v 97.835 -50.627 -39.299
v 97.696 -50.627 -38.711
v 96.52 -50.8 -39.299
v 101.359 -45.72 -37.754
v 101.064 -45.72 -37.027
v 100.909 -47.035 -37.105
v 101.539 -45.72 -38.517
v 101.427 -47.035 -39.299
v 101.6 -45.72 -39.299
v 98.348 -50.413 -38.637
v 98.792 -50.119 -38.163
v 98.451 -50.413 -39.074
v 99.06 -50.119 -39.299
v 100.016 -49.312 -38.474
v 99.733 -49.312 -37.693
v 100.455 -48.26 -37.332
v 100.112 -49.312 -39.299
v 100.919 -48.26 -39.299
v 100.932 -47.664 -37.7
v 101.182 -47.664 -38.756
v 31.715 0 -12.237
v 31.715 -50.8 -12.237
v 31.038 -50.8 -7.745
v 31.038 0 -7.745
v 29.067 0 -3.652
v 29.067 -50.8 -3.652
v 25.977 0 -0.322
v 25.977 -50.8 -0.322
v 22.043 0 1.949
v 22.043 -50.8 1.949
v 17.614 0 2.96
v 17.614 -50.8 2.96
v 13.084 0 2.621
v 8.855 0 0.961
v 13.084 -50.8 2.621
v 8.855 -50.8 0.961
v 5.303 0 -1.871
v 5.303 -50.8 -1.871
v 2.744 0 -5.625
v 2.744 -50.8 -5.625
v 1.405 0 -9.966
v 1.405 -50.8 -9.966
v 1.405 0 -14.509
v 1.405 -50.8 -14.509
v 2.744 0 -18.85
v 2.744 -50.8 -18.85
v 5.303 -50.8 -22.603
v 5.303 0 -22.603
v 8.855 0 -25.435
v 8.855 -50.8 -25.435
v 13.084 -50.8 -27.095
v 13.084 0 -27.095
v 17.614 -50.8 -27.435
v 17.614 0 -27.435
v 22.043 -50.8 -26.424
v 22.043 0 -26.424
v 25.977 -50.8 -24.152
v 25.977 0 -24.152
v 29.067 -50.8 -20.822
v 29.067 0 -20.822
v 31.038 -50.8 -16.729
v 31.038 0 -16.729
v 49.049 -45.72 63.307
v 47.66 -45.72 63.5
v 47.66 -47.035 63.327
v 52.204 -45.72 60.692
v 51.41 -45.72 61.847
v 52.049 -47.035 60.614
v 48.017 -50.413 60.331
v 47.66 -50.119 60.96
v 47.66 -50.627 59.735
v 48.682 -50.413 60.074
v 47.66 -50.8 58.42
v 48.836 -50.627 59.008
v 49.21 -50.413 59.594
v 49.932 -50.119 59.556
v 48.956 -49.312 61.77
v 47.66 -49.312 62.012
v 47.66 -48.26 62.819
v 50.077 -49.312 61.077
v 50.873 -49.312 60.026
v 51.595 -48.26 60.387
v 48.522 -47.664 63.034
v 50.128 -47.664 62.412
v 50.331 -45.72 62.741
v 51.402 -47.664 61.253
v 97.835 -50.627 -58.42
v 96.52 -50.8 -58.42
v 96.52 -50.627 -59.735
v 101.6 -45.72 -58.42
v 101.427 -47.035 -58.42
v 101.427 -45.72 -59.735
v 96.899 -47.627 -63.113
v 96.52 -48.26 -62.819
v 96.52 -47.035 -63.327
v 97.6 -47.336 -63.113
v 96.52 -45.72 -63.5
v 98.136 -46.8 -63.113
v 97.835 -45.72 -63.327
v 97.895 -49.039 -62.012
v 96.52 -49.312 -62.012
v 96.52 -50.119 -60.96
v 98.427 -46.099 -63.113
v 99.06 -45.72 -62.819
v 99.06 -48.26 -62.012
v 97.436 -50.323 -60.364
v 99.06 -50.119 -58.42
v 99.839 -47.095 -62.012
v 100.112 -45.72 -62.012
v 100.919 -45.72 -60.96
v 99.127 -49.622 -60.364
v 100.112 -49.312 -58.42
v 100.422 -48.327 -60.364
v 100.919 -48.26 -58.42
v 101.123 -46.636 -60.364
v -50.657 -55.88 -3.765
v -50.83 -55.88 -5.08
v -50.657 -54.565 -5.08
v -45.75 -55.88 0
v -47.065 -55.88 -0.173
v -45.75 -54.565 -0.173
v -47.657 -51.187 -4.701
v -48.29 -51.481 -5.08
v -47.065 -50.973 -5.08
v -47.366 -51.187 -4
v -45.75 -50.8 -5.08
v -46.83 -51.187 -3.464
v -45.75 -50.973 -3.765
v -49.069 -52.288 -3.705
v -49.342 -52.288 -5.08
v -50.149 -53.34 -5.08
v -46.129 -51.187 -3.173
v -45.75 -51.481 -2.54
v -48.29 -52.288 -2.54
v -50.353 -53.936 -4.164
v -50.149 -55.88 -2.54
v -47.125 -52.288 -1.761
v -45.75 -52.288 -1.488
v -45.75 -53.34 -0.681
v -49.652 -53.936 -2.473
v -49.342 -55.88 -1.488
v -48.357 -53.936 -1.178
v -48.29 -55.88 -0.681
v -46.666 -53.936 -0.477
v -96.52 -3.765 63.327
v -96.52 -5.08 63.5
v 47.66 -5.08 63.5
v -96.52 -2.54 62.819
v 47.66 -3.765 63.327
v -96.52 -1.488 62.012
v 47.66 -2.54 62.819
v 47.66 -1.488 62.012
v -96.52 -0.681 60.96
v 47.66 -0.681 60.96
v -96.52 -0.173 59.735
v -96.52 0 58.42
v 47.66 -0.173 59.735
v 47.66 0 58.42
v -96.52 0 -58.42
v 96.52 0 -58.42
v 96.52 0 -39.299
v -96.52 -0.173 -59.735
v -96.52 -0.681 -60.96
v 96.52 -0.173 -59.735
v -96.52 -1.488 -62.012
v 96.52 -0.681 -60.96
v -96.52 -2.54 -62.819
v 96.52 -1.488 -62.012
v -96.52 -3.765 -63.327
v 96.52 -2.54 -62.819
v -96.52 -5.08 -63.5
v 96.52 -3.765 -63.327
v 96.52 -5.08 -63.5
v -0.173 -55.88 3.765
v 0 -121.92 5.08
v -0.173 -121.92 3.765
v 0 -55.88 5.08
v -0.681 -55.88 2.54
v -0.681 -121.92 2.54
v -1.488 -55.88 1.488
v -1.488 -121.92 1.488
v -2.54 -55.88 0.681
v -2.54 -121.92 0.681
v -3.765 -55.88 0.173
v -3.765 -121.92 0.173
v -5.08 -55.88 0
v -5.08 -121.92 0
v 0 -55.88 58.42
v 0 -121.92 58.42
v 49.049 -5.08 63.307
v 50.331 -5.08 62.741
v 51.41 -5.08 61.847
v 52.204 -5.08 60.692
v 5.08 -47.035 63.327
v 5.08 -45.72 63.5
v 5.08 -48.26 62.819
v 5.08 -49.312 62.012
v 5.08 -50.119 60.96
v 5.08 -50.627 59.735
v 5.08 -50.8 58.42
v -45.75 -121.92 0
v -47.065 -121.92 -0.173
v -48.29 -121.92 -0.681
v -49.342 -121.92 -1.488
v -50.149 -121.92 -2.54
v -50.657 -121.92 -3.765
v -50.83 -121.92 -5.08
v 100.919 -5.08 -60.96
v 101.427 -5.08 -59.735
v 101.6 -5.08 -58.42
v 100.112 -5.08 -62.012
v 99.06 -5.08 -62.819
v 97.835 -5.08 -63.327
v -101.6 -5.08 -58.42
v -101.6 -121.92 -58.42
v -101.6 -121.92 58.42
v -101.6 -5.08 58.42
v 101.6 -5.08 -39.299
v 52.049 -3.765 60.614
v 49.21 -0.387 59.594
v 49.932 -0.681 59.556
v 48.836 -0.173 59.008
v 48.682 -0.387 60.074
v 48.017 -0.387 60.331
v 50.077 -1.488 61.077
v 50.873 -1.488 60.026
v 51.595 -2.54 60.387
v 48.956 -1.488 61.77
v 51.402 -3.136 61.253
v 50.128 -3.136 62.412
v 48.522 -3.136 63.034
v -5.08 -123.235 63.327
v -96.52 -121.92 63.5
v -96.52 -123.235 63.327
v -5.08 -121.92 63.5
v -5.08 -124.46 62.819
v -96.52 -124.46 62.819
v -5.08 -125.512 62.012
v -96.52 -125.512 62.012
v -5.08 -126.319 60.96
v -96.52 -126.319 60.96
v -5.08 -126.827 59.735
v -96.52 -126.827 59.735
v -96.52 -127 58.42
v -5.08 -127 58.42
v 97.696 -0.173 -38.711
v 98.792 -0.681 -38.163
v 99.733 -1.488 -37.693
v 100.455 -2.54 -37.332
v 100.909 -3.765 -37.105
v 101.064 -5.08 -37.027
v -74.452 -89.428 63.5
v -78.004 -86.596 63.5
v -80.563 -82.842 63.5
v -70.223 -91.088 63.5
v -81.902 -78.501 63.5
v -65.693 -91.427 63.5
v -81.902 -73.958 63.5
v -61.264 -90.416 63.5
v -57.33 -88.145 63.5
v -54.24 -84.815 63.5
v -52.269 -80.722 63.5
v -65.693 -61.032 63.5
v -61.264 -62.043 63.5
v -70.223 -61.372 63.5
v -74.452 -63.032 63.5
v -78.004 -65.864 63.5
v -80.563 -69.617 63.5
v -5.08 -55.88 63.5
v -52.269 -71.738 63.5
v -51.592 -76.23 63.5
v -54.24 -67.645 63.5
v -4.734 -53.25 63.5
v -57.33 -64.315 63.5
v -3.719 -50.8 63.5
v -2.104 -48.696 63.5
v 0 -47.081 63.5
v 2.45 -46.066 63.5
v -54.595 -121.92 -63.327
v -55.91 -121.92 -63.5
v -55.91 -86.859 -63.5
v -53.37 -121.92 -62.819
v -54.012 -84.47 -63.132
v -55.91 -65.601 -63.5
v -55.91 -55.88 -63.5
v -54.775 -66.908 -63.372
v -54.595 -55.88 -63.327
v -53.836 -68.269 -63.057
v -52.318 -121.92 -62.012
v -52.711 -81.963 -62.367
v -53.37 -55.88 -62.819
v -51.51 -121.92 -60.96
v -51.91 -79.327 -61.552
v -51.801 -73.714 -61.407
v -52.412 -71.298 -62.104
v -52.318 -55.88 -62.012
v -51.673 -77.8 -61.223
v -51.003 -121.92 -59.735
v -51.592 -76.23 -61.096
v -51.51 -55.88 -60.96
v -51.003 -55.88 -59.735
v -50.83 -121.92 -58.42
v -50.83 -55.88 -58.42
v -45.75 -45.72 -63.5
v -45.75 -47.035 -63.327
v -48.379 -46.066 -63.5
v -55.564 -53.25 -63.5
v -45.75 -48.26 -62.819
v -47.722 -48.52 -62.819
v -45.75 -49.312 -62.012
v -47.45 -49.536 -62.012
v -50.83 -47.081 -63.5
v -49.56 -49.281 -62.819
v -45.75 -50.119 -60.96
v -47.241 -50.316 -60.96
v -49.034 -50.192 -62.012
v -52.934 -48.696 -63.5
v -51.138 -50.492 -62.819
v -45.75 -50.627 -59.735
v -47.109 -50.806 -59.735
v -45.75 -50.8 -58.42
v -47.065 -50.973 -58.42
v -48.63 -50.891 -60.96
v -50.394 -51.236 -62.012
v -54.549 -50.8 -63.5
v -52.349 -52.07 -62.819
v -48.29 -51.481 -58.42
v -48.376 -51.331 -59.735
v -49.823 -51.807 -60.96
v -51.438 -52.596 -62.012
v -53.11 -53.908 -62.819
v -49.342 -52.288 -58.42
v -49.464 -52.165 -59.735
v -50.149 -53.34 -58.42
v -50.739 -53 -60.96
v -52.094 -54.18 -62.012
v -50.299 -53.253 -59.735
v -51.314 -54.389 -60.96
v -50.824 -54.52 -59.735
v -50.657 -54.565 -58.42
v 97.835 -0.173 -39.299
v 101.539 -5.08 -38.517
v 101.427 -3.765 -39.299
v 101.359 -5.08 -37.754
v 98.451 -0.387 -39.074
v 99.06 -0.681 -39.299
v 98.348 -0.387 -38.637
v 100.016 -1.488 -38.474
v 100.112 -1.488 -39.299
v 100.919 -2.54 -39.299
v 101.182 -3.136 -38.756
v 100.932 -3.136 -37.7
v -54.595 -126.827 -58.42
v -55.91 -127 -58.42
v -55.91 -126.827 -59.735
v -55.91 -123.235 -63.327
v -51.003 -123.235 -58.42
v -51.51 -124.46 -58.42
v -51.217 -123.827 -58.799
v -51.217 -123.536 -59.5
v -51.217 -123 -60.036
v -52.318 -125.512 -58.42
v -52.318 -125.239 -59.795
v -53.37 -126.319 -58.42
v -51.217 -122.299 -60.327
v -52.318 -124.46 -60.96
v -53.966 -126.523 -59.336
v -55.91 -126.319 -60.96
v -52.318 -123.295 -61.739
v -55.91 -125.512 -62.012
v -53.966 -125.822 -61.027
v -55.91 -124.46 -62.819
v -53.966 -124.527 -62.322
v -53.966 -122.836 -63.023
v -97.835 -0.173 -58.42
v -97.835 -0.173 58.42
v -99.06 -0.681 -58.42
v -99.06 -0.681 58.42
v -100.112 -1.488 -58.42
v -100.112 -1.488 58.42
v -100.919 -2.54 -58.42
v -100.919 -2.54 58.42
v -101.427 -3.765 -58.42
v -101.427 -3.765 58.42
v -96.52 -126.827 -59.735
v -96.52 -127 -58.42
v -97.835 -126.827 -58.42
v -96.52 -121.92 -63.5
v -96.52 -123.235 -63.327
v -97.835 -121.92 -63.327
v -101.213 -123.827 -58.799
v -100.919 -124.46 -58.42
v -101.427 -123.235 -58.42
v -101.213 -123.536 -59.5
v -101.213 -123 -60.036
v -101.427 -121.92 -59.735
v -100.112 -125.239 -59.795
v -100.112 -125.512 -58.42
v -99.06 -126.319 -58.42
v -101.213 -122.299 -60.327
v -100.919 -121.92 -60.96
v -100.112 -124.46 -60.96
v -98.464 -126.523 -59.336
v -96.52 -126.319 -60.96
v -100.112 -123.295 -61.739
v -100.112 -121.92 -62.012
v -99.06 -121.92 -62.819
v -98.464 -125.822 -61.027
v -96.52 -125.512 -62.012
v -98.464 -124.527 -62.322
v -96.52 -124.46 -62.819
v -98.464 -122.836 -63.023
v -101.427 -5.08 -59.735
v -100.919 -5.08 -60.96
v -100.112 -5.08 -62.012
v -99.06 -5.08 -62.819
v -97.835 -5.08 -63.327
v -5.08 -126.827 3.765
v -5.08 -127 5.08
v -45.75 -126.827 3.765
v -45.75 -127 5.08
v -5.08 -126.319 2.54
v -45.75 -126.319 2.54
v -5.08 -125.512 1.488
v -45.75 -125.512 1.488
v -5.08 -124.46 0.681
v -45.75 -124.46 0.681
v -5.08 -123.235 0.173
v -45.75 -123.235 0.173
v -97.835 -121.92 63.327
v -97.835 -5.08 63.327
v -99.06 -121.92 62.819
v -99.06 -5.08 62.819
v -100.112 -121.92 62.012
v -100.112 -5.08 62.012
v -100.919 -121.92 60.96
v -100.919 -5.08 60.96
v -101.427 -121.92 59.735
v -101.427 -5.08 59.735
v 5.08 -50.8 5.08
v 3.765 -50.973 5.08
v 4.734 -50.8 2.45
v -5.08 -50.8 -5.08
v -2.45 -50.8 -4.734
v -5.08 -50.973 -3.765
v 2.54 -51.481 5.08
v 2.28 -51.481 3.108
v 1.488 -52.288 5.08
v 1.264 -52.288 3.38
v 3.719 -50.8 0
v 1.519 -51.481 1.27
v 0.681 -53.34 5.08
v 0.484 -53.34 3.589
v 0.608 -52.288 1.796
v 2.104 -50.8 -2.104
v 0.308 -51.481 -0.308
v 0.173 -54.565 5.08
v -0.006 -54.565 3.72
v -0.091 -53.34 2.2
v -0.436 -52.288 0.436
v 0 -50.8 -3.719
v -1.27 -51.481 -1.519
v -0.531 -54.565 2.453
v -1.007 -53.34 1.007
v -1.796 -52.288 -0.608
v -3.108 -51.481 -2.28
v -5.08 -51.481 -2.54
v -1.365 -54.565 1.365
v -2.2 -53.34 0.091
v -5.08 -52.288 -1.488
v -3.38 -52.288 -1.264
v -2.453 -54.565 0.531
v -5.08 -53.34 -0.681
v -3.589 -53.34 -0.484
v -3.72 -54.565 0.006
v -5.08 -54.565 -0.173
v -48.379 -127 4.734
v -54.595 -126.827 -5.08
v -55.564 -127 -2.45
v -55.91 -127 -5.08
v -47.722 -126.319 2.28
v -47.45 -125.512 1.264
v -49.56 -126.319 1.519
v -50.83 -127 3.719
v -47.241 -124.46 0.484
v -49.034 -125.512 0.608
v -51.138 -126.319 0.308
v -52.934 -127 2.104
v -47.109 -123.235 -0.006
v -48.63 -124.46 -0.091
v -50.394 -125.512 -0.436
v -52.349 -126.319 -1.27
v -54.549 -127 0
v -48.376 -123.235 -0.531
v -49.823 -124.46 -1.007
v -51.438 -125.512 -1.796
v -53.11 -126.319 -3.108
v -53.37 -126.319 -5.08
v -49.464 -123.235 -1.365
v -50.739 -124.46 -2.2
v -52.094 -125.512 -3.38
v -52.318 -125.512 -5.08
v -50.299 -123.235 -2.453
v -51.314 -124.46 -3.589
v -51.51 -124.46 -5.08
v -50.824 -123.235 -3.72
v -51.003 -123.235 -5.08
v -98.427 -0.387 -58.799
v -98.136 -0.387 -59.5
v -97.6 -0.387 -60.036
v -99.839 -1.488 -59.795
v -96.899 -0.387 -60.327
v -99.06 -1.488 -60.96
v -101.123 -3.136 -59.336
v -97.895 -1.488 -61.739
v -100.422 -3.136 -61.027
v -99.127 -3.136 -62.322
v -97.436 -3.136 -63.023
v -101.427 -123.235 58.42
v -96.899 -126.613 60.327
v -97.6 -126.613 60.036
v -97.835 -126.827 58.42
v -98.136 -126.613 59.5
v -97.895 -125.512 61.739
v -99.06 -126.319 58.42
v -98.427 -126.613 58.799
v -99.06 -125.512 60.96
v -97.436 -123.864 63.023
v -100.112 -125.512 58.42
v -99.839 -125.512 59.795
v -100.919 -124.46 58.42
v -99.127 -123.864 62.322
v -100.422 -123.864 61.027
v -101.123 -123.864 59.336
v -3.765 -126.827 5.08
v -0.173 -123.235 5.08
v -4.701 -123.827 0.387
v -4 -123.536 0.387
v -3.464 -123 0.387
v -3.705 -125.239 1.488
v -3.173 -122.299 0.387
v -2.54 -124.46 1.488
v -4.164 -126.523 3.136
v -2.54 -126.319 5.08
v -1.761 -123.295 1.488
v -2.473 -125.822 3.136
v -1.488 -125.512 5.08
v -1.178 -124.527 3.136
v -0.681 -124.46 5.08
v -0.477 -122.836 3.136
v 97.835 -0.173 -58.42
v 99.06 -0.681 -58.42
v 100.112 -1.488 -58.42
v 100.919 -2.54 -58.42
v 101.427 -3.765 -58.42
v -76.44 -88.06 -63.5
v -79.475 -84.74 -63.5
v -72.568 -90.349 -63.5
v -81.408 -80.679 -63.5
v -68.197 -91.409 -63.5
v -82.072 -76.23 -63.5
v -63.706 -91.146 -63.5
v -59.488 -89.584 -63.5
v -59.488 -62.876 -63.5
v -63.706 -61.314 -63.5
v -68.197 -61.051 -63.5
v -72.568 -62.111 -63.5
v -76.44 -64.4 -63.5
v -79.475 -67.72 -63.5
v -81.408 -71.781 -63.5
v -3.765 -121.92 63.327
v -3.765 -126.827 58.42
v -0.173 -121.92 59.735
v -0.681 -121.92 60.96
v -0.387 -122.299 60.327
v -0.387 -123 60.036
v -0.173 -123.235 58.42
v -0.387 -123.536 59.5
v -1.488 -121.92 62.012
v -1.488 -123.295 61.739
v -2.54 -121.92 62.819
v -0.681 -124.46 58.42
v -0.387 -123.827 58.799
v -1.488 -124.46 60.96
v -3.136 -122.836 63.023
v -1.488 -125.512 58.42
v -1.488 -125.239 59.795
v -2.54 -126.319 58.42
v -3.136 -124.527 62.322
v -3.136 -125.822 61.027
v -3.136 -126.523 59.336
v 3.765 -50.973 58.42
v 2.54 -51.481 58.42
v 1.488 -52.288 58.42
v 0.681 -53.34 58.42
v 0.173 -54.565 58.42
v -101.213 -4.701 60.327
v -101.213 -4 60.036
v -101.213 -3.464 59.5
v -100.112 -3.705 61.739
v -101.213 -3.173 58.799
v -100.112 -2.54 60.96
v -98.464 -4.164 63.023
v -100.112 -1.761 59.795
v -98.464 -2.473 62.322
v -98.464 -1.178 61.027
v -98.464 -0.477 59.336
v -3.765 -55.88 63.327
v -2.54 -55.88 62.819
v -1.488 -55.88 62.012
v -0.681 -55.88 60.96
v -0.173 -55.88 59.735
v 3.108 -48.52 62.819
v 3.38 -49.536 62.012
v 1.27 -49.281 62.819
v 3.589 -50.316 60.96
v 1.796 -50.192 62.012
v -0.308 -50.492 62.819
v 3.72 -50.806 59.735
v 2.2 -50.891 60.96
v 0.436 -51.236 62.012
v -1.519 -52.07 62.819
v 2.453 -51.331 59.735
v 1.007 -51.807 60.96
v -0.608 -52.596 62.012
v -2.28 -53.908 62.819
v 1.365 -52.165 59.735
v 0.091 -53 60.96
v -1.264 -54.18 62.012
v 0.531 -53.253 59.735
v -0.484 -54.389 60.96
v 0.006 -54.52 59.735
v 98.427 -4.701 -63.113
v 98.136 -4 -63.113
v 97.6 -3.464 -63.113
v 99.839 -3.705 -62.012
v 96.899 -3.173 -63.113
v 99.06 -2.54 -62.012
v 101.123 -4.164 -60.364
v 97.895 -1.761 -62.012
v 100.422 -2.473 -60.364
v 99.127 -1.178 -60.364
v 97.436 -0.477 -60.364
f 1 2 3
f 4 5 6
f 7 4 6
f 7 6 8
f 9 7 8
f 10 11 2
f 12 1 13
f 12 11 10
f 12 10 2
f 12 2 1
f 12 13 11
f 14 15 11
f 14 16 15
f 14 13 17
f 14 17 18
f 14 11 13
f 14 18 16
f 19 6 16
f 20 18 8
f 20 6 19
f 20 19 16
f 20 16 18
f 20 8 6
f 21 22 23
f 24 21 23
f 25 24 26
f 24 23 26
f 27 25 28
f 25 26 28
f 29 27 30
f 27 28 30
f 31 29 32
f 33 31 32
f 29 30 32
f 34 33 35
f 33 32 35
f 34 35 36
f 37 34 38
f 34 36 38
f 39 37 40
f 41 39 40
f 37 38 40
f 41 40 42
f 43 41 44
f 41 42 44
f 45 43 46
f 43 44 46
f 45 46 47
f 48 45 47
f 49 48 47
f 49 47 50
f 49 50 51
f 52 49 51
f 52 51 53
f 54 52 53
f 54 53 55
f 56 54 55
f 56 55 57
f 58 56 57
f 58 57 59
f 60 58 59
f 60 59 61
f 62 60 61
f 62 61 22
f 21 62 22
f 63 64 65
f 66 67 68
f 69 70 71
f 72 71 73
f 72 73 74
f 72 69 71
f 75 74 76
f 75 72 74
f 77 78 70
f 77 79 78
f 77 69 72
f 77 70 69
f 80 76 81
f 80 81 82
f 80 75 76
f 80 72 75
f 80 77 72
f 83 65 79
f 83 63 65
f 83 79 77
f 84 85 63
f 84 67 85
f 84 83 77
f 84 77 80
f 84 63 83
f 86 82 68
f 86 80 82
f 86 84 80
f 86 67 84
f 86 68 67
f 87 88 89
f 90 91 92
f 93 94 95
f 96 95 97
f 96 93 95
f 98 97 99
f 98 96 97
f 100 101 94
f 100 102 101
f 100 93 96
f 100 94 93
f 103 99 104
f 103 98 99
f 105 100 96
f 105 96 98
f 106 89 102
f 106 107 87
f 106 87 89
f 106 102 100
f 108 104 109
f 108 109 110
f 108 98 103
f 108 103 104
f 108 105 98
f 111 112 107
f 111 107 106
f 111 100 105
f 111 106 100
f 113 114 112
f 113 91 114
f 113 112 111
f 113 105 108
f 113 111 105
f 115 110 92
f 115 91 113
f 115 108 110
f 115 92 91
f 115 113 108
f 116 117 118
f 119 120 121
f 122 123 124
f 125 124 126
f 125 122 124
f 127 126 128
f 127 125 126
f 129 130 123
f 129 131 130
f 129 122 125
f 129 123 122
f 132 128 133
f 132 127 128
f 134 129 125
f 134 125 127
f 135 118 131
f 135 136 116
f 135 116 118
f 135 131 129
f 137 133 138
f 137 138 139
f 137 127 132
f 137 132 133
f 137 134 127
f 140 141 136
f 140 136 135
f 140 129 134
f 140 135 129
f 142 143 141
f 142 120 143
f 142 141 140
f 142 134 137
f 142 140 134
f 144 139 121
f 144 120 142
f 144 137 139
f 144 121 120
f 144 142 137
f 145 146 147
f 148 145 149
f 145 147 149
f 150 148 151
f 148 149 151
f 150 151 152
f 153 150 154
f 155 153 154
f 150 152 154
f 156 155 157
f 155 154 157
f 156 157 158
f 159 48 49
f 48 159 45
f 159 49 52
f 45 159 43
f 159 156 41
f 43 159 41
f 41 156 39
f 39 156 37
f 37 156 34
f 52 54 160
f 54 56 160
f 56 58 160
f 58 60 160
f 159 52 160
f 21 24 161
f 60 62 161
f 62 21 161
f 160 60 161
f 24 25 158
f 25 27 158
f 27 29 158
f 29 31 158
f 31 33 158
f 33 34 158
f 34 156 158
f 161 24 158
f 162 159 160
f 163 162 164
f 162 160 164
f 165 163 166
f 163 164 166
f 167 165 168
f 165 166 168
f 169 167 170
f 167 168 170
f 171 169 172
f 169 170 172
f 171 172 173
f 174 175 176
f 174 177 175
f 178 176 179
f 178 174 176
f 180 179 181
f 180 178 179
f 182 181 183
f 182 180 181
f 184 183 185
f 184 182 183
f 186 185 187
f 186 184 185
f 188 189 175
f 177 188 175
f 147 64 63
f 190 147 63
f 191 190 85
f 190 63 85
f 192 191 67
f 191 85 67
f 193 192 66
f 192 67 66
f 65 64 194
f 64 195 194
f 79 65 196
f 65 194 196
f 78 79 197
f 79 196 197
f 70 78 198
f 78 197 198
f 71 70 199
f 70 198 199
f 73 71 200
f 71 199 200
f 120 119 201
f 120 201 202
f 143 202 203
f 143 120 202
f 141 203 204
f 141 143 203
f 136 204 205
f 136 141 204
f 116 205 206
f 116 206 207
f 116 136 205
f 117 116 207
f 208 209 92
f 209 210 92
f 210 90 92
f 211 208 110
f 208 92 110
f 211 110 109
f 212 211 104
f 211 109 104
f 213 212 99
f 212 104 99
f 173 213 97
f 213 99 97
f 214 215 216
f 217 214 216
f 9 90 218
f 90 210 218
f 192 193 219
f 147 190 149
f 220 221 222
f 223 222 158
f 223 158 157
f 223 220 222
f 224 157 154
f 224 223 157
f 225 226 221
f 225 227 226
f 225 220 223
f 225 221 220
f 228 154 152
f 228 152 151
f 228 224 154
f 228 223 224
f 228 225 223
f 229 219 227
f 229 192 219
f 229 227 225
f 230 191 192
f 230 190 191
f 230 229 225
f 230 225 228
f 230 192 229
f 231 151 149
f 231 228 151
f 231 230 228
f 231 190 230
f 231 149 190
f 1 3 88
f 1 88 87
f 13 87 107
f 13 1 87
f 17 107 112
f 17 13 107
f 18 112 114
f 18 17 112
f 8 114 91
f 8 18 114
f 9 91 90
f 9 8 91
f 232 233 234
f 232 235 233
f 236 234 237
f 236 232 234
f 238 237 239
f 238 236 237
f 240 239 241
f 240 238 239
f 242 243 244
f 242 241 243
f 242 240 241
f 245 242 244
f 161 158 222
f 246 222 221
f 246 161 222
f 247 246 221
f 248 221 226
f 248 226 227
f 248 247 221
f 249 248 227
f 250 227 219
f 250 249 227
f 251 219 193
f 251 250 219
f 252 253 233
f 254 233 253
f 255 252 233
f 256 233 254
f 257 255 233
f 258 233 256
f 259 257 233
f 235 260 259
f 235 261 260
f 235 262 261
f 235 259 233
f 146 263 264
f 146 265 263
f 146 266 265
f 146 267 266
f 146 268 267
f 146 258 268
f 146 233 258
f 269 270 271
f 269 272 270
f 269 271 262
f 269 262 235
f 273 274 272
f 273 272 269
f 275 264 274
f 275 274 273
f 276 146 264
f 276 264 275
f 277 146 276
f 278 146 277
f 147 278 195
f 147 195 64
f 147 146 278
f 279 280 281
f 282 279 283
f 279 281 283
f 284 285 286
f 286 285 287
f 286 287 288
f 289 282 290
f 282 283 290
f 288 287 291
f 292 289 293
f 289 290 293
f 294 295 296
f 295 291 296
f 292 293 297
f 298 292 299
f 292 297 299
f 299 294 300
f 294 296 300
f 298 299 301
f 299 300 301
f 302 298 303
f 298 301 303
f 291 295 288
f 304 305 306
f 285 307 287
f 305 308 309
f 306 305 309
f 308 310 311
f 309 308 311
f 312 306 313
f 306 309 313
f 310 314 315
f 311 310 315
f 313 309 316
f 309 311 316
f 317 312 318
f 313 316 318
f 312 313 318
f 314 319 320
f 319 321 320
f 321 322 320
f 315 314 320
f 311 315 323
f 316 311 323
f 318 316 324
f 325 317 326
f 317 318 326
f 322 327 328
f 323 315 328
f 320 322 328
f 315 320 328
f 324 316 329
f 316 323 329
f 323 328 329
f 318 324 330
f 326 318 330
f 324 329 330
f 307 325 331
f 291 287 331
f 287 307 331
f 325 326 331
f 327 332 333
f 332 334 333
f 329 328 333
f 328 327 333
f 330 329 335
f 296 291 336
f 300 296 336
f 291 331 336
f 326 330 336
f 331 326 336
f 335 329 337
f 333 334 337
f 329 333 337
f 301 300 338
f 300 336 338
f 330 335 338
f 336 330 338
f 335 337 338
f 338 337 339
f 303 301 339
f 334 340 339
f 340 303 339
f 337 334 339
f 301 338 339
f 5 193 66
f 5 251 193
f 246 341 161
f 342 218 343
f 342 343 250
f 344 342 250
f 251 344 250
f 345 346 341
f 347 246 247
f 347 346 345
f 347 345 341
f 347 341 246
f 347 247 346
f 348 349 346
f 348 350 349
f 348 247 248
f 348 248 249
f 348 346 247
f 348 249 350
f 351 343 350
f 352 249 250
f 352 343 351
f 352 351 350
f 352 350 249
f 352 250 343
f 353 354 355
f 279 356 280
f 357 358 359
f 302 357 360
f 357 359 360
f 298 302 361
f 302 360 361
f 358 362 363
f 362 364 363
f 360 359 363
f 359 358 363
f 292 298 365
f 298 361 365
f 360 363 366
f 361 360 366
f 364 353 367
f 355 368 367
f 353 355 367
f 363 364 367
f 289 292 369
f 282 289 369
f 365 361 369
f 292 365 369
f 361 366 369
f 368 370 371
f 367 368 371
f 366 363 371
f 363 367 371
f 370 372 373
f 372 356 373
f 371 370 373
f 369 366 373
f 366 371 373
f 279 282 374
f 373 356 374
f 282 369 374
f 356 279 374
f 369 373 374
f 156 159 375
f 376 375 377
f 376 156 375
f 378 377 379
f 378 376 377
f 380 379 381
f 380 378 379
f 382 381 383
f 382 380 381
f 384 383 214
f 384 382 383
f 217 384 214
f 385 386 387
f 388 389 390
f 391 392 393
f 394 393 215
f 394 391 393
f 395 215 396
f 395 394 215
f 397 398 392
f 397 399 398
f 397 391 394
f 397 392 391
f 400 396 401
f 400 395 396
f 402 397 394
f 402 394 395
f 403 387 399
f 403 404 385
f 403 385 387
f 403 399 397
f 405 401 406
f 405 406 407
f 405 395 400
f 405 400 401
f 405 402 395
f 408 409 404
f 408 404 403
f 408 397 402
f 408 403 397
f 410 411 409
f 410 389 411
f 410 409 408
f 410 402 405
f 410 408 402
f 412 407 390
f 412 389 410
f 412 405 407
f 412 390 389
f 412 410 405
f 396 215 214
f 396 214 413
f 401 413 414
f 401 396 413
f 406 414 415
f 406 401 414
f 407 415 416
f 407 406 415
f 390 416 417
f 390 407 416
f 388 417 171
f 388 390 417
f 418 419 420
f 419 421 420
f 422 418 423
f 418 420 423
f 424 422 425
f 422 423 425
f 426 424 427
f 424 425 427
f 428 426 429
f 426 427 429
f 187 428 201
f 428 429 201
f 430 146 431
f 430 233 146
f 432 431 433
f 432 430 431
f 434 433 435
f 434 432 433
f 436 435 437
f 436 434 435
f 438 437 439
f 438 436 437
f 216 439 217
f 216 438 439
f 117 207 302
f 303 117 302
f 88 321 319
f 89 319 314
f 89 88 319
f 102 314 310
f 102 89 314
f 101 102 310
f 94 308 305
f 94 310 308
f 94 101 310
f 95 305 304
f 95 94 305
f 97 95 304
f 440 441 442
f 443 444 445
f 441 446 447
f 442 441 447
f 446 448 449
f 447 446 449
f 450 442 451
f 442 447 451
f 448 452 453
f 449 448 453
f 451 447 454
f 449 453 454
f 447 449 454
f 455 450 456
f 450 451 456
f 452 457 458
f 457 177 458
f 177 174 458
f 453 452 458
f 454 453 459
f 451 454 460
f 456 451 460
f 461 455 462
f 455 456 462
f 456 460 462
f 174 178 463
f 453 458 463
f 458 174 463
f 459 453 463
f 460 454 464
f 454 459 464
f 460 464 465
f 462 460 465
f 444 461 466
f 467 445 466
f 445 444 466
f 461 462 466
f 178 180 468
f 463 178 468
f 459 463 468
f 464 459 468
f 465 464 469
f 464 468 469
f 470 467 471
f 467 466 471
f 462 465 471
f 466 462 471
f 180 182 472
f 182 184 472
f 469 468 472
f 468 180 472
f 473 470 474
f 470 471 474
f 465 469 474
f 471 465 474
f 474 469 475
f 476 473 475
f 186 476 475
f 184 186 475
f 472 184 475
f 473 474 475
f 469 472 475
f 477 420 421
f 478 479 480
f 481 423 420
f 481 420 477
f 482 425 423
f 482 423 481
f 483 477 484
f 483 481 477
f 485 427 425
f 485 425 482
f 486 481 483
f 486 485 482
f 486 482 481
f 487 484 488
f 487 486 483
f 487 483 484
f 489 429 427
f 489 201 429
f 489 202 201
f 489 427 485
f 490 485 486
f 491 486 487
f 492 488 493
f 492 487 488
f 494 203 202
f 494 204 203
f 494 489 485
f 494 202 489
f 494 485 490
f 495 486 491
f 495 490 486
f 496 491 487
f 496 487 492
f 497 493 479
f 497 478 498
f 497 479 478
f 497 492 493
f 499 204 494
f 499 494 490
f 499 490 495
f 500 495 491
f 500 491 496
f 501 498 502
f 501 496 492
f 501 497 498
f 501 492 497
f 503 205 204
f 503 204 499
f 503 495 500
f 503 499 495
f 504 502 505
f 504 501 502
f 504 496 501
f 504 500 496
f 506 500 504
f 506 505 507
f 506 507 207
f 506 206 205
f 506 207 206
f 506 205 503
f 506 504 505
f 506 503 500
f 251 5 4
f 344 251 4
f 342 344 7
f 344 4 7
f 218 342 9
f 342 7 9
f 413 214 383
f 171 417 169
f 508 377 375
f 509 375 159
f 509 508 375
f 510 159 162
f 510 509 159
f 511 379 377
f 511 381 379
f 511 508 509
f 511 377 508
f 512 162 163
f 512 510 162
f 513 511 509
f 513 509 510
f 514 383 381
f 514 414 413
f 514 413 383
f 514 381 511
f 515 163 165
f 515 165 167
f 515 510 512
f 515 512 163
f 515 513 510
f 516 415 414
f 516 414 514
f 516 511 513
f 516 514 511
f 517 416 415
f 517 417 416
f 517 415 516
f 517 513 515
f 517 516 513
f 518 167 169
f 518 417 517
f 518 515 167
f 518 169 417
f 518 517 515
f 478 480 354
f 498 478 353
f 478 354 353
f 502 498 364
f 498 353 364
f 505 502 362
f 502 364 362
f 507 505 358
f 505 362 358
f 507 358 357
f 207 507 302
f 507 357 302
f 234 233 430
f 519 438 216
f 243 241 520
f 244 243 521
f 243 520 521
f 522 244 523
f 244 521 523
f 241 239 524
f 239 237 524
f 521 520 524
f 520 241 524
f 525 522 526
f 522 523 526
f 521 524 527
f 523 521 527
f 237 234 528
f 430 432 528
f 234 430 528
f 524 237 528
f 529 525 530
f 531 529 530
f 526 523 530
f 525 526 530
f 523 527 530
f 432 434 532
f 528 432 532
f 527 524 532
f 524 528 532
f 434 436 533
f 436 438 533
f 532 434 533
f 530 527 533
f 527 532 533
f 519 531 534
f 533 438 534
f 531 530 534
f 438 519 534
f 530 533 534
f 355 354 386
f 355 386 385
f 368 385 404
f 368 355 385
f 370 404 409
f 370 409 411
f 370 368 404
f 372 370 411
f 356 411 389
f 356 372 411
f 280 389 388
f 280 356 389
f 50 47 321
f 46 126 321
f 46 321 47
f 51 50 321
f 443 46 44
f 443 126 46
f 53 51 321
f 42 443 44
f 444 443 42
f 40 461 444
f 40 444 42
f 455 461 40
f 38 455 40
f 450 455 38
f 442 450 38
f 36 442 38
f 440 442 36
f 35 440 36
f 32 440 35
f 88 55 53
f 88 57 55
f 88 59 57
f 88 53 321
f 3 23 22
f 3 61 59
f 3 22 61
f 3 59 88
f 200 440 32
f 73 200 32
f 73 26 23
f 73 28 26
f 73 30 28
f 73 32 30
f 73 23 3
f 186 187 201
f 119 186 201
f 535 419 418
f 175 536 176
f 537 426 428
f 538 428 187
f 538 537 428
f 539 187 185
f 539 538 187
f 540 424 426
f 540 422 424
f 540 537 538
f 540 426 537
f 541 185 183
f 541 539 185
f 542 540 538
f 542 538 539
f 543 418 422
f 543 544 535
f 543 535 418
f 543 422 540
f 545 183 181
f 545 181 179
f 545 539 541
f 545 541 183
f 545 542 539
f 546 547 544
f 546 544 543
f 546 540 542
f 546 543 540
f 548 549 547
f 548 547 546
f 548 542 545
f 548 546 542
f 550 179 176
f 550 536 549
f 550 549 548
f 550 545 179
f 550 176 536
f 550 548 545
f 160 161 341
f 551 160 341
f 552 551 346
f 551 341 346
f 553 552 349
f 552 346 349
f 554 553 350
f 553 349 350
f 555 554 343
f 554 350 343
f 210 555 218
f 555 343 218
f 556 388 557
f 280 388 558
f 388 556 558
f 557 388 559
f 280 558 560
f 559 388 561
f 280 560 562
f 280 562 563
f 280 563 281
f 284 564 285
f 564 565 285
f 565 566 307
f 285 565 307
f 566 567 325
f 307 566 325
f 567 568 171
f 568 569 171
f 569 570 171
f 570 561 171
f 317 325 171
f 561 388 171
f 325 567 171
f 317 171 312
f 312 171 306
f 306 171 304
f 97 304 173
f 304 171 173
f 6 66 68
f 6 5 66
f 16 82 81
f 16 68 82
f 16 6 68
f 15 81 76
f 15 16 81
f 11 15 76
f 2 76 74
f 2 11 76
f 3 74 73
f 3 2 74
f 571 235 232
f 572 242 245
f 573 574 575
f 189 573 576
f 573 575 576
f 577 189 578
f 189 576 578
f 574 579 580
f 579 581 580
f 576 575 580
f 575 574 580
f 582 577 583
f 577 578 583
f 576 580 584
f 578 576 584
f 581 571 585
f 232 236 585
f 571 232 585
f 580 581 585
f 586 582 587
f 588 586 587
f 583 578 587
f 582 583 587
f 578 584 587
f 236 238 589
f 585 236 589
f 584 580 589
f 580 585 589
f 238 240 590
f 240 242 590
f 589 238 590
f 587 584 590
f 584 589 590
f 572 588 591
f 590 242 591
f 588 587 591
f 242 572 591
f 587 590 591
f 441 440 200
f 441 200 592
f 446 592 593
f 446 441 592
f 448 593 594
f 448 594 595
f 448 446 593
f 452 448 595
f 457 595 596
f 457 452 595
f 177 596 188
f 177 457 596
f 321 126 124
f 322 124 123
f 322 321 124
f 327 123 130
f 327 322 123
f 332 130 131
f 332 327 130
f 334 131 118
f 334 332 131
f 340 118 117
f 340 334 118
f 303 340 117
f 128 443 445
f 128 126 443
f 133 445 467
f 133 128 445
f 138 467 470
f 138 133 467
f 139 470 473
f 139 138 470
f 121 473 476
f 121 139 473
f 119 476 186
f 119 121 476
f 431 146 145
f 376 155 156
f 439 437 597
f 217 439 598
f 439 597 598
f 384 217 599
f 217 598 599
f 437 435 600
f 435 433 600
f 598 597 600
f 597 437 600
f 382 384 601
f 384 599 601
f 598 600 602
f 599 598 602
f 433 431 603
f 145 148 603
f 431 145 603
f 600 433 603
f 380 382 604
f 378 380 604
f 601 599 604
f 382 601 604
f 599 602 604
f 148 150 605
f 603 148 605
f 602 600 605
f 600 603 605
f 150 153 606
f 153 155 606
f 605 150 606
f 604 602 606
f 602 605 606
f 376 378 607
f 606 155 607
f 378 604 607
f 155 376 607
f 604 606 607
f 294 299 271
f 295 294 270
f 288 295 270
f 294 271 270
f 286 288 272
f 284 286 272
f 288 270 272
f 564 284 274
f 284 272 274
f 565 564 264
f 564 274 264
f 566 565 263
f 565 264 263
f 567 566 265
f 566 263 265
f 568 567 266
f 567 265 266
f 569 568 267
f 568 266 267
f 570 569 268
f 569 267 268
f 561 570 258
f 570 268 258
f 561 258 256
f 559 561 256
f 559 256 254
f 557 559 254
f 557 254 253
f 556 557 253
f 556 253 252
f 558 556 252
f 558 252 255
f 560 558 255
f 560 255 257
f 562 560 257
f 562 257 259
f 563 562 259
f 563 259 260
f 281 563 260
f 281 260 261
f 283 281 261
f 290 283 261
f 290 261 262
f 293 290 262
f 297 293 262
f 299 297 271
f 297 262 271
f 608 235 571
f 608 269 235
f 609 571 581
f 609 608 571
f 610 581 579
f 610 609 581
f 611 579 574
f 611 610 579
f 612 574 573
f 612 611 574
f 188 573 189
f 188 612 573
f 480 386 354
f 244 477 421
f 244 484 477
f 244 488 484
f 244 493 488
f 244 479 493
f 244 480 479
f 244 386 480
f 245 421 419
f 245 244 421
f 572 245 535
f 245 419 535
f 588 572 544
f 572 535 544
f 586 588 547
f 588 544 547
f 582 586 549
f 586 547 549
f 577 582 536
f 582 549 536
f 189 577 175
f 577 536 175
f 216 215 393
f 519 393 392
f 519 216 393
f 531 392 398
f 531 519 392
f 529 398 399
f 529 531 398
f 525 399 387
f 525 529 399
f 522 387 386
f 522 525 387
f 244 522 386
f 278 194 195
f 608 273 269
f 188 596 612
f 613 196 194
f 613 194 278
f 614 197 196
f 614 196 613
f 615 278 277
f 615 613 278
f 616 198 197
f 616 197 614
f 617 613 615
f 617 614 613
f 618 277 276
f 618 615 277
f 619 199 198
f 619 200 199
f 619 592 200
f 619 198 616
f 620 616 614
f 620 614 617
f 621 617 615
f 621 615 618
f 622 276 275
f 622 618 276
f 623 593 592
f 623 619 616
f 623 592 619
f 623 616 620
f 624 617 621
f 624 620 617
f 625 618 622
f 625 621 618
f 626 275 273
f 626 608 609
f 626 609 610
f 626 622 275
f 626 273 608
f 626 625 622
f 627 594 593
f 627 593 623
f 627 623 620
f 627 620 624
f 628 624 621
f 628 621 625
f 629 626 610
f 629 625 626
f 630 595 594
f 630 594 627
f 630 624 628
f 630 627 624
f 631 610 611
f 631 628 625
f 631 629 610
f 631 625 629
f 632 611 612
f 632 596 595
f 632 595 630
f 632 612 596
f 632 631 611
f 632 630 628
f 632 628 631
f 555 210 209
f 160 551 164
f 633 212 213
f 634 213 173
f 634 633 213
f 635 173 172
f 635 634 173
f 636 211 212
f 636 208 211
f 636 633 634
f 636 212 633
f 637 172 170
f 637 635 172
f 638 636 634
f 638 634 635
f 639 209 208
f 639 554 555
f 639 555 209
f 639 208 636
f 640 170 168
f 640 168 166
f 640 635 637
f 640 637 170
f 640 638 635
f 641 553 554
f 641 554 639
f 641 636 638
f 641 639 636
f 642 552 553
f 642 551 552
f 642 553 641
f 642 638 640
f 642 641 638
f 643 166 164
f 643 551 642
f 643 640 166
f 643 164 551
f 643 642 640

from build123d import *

# Parameters (mm, degrees)
F0_W          = 203.2
F0_H          = 127
F1_DEPTH      = 127
F3_DEPTH      = 76.2
F4_SIZE2      = 101.6
F4_SIZE       = 50.8
F5_R          = 5.08
F6_R          = 15.24
F7_DEPTH      = 101.6
F7_DEPTH_BACK = 101.6
F8_R          = 15.24
F9_DEPTH      = 127
F9_DEPTH_BACK = 127


with BuildPart() as f1:
    # F0 (on Front) → F1 (new body)
    with BuildSketch(Plane.XZ):
        Rectangle(F0_W, F0_H)
    extrude(amount=F1_DEPTH)

    # F2 (on face) → F3 (cut)
    with BuildSketch(Plane.XZ.offset(127)):
        Polygon((101.6, 63.5), (0, 63.5), (0, 0), (-50.8298836648, 0), (-50.8298836648, -63.5), (101.6, -63.5), align=None)
    extrude(amount=-F3_DEPTH, mode=Mode.SUBTRACT)

    # F4
    f4_edges = [f1.edges().sort_by_distance(p)[0] for p in [
        (101.6, -25.4, 63.5),
    ]]
    f4_side = f1.faces().sort_by_distance((-21.771429, -52.614286, 63.5))[0]
    chamfer(f4_edges, length=F4_SIZE, length2=F4_SIZE2, reference=f4_side)

    # F5
    f5_edges = [f1.edges().sort_by_distance(p)[0] for p in [
        (-25.4, 0, 63.5),
        (50.8, -25.4, 63.5),
        (-101.6, -63.5, 63.5),
        (25.4, -50.8, 63.5),
        (-50.8, -127, 63.5),
        (0, -88.9, 63.5),
        (-76.214942, -127, -63.5),
        (-101.6, -127, 0),
        (0, -127, 31.75),
        (-25.414942, -127, 0),
        (-50.829884, -127, -31.75),
        (0, -88.9, 0),
        (0, -50.8, 31.75),
        (-50.829884, -88.9, 0),
        (-50.829884, -88.9, -63.5),
        (-50.829884, -50.8, -31.75),
        (76.2, -50.8, 12.7),
        (101.6, -50.8, -50.8),
        (-25.414942, -50.8, 0),
        (25.385058, -50.8, -63.5),
        (76.2, 0, 12.7),
        (101.6, -25.4, -38.1),
        (101.6, 0, -50.8),
        (101.6, -25.4, -63.5),
        (-101.6, -63.5, -63.5),
        (-101.6, 0, 0),
        (0, 0, -63.5),
    ]]
    fillet(f5_edges, radius=F5_R)

    # F6 (on face) → F7 (cut, two sides)
    with BuildSketch(Plane.XZ.offset(50.8)) as f7_sk:
        with Locations((16.4750218391, -12.237187475)):
            Circle(F6_R)
    extrude(amount=-F7_DEPTH, mode=Mode.SUBTRACT)
    extrude(f7_sk.sketch, amount=F7_DEPTH_BACK, mode=Mode.SUBTRACT)

    # F8 (on face) → F9 (cut, two sides)
    with BuildSketch(Plane.XY.offset(63.5)) as f9_sk:
        with Locations((-66.8318793178, -76.2298852205)):
            Circle(F8_R)
    extrude(amount=F9_DEPTH, mode=Mode.SUBTRACT)
    extrude(f9_sk.sketch, amount=-F9_DEPTH_BACK, mode=Mode.SUBTRACT)


solid = f1.part
